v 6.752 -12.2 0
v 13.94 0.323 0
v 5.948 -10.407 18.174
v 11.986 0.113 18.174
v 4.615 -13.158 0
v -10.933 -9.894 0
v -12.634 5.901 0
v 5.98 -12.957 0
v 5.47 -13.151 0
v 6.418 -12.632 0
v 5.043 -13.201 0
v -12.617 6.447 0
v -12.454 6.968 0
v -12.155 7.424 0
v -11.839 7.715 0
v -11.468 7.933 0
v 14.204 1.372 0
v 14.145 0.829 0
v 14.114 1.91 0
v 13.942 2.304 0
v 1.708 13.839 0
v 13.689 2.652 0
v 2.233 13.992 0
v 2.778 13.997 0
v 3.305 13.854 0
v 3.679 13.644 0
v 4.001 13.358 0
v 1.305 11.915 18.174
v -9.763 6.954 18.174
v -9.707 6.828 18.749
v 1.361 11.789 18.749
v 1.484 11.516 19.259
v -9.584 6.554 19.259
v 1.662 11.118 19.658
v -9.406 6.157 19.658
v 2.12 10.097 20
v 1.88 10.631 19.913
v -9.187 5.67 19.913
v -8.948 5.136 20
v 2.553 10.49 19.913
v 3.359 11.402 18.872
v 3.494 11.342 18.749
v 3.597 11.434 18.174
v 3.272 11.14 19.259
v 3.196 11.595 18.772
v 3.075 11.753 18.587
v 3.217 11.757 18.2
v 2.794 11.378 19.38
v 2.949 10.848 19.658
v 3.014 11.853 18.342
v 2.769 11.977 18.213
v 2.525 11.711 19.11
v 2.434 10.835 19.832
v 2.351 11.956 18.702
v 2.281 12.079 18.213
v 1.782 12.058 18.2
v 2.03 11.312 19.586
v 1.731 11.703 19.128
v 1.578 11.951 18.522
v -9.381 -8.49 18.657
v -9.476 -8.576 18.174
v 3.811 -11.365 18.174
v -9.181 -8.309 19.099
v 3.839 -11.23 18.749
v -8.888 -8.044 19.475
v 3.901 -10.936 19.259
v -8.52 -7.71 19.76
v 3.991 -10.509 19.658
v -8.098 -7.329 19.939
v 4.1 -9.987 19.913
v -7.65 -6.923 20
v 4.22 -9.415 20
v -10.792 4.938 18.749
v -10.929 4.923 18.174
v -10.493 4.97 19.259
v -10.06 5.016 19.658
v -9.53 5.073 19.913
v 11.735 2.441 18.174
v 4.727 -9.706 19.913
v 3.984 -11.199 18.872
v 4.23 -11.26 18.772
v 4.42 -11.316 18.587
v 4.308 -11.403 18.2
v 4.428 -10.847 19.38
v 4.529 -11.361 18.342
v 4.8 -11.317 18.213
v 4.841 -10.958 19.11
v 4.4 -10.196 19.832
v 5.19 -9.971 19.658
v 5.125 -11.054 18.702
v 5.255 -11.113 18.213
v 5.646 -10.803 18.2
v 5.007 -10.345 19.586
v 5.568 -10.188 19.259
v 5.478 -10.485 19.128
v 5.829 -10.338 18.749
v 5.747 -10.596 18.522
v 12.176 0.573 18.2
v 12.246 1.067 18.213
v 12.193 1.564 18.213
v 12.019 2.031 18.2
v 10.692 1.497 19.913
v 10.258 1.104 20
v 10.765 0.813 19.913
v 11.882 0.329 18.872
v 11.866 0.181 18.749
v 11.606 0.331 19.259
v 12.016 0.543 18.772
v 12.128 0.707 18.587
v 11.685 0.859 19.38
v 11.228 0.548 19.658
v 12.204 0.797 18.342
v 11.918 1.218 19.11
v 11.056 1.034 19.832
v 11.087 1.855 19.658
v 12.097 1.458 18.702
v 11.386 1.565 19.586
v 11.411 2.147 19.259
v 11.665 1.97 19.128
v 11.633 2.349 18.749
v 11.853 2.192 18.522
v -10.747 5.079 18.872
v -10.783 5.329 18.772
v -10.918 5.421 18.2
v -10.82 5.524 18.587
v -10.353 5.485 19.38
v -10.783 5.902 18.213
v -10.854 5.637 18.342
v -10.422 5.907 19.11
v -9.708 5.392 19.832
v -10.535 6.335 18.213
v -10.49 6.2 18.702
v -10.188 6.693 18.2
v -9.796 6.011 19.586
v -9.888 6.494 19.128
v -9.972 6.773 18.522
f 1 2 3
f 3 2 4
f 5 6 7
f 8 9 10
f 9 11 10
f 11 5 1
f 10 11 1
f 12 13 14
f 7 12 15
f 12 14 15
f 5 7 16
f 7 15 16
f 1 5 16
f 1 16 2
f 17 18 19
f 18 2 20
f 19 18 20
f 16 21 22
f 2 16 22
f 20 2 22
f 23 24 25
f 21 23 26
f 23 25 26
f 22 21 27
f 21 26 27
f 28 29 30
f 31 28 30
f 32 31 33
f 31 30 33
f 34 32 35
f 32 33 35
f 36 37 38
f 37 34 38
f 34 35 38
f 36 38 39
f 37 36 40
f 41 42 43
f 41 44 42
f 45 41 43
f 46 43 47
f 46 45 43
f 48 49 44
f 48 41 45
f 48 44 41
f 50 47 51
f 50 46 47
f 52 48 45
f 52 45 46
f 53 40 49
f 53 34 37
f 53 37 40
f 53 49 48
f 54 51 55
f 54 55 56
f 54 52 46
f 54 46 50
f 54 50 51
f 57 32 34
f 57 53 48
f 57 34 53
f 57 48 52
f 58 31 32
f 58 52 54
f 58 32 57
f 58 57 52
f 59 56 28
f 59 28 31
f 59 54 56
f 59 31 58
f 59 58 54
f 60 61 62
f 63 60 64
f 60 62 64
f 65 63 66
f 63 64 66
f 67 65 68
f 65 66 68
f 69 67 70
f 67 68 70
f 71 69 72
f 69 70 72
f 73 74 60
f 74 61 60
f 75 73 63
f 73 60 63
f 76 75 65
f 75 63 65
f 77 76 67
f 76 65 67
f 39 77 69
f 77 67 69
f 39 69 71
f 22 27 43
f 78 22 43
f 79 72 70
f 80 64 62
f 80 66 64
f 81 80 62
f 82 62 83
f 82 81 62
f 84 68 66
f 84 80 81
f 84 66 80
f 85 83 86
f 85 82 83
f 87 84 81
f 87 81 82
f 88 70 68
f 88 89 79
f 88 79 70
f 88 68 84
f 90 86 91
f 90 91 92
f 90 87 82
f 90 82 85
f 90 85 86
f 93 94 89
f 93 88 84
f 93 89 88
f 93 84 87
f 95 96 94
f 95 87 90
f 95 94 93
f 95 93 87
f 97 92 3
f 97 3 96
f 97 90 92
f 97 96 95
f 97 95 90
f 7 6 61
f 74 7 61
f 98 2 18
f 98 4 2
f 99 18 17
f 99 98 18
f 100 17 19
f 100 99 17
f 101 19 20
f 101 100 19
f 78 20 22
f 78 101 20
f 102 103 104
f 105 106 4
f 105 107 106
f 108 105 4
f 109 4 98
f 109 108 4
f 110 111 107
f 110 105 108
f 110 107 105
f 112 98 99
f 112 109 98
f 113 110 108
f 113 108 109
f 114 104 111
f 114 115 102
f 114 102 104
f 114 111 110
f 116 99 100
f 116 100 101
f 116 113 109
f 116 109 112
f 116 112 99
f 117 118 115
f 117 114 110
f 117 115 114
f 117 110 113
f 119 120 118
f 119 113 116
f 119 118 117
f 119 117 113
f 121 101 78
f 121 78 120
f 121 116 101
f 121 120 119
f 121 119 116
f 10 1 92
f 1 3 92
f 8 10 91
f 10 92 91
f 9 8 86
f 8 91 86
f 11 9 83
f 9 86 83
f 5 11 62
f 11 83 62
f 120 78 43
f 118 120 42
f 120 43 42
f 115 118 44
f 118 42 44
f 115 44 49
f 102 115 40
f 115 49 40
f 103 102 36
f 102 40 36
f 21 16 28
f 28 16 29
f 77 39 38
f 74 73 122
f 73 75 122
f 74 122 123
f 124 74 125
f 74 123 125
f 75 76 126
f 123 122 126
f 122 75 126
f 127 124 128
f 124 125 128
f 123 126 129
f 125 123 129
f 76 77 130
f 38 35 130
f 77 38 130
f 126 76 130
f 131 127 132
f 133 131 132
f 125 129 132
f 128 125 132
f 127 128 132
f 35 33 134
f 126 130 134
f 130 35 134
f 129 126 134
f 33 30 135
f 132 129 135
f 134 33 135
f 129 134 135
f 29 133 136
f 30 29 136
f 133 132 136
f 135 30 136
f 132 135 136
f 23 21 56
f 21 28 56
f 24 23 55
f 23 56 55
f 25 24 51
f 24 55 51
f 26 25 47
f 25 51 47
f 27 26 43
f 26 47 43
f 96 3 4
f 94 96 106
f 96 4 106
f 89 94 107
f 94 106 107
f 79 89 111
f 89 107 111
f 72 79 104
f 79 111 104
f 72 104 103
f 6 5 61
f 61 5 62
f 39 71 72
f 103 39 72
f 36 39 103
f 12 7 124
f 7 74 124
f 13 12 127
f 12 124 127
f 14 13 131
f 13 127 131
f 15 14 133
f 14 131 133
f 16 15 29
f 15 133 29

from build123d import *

# Parameters (mm, degrees)
F1_DEPTH = 20
F1_TAPER = 5
F2_R     = 2


with BuildPart() as f1:
    # F0 (on Top) → F1 (new body)
    with BuildSketch(Plane.XY):
        Polygon((6.0316065778, -13.4554637656), (14.66077543, 1.5784317688), (3.0292509394, 14.4309882477), (-12.788595389, 7.3404094595), (-10.9330375582, -9.8943657103), align=None)
    extrude(amount=F1_DEPTH, taper=F1_TAPER)

    # F2
    f2_edges = [f1.edges().sort_by_distance(p)[0] for p in [
        (-4.163932, 9.289008, 20),
        (7.547645, 6.830596, 20),
        (-10.121097, -1.089674, 20),
        (8.828634, -5.067467, 20),
        (-2.09125, -9.962463, 20),
        (2.807089, 13.372634, 10.000005),
        (13.585569, 1.462671, 10.000005),
        (-11.850693, 6.802072, 10),
        (5.589255, -12.468654, 10),
    ]]
    fillet(f2_edges, radius=F2_R)


solid = f1.part
